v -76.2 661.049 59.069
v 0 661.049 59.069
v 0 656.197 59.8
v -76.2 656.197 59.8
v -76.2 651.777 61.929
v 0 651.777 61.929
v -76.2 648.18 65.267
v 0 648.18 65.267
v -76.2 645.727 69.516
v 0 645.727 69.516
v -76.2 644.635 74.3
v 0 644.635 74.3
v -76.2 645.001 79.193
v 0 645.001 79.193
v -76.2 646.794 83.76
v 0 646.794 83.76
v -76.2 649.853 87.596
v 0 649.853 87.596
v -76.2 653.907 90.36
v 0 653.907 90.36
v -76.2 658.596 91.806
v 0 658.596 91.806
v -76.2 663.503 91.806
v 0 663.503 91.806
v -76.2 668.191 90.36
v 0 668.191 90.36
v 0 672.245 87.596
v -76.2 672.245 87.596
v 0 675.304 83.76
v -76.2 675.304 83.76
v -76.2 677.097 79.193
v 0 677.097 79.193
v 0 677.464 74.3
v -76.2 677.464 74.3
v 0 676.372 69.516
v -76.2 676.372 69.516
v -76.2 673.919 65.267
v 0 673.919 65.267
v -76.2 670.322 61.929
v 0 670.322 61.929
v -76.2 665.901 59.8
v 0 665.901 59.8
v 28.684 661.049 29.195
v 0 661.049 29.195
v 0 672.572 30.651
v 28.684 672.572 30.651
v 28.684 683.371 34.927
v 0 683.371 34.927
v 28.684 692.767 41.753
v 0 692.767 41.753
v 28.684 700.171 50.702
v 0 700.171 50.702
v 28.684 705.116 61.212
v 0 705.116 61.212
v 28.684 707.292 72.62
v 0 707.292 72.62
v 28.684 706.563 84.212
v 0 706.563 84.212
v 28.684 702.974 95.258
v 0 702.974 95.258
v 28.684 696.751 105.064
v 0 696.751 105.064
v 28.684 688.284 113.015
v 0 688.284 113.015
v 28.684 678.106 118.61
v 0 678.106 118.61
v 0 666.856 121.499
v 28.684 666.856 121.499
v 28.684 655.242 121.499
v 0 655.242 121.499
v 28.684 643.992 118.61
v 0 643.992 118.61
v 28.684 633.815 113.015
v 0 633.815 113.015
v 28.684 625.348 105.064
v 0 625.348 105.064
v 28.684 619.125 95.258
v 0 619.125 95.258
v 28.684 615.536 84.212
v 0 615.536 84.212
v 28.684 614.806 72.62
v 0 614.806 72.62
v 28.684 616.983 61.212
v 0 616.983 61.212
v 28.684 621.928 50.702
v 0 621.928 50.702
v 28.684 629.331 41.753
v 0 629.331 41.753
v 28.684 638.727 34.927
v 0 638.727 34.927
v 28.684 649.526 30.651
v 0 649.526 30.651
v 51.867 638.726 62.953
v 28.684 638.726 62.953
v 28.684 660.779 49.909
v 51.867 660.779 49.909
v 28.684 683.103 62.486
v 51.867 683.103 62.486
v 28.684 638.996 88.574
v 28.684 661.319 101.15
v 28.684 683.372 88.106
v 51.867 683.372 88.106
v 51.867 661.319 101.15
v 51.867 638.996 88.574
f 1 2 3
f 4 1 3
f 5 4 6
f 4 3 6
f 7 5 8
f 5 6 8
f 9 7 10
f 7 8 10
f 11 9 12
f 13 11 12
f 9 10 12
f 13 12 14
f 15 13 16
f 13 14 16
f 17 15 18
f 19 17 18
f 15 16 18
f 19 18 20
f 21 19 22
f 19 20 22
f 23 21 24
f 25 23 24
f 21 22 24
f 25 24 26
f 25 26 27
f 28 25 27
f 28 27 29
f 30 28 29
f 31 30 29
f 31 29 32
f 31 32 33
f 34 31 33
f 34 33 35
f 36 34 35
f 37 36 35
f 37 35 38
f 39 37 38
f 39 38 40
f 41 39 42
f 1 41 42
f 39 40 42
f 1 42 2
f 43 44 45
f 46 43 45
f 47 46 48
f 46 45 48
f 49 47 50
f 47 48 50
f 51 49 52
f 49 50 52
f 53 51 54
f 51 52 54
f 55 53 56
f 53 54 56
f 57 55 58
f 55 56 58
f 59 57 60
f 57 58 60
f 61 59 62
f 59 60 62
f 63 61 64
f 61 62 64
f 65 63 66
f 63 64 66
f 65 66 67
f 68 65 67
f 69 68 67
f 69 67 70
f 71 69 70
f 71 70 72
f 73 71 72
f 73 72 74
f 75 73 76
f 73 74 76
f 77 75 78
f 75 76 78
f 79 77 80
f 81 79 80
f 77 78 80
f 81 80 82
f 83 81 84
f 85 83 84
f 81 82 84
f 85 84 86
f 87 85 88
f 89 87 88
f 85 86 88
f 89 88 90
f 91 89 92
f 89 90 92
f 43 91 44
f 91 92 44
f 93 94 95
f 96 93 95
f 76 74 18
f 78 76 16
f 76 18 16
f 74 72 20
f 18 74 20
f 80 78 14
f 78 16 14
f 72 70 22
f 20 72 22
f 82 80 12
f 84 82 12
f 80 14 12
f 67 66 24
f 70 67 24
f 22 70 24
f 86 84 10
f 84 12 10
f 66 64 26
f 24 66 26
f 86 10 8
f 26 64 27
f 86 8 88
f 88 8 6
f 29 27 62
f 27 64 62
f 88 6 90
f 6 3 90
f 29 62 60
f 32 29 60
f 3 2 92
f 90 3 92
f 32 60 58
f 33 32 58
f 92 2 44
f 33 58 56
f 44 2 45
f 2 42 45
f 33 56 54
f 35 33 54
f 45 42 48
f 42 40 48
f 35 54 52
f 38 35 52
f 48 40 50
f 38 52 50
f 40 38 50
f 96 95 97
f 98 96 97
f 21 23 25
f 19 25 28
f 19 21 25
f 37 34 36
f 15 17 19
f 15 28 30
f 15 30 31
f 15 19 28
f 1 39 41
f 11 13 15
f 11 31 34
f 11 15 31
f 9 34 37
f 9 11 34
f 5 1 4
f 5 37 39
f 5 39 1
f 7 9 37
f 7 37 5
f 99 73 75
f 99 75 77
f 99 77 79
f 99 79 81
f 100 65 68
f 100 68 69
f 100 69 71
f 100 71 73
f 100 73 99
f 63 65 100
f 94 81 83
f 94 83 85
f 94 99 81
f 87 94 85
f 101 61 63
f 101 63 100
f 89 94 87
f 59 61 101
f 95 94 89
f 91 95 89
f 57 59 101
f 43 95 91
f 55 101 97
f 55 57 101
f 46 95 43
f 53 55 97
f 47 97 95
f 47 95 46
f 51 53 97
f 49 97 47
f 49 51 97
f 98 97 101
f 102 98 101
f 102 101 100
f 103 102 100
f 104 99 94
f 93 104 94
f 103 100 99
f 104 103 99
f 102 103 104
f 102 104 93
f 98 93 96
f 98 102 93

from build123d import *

# Parameters (mm, degrees)
SKETCH1_R           = 46.334426
BOSS_EXTRUDE1_DEPTH = 28.68422
BOSS_EXTRUDE2_DEPTH = 23.18258
SKETCH3_R           = 16.460544738
BOSS_EXTRUDE3_DEPTH = 76.2


with BuildPart() as part:
    # Sketch1 → Boss-Extrude1 (new body)
    with BuildSketch(Plane(origin=(0, 0, 0), x_dir=(0, 0, -1), z_dir=(1, 0, 0))):
        with Locations((-75.529694, 661.049224)):
            Circle(SKETCH1_R)
    extrude(amount=BOSS_EXTRUDE1_DEPTH)

    # Sketch2 → Boss-Extrude2 (add)
    with BuildSketch(Plane(origin=(28.68422, 0, 0), x_dir=(0, 0, -1), z_dir=(1, 0, 0))):
        Polygon((-101.15042, 661.318972), (-88.573665621, 638.995898421), (-62.952939621, 638.726150421), (-49.908968, 660.779476), (-62.485722379, 683.102549579), (-88.106448379, 683.372297579), align=None)
    extrude(amount=BOSS_EXTRUDE2_DEPTH)

    # Sketch3 → Boss-Extrude3 (add)
    with BuildSketch(Plane.ZY):
        with Locations(Location((75.529694, 661.049224, 0), (0, 0, 180))):
            Circle(SKETCH3_R)
    extrude(amount=BOSS_EXTRUDE3_DEPTH)


solid = part.part
